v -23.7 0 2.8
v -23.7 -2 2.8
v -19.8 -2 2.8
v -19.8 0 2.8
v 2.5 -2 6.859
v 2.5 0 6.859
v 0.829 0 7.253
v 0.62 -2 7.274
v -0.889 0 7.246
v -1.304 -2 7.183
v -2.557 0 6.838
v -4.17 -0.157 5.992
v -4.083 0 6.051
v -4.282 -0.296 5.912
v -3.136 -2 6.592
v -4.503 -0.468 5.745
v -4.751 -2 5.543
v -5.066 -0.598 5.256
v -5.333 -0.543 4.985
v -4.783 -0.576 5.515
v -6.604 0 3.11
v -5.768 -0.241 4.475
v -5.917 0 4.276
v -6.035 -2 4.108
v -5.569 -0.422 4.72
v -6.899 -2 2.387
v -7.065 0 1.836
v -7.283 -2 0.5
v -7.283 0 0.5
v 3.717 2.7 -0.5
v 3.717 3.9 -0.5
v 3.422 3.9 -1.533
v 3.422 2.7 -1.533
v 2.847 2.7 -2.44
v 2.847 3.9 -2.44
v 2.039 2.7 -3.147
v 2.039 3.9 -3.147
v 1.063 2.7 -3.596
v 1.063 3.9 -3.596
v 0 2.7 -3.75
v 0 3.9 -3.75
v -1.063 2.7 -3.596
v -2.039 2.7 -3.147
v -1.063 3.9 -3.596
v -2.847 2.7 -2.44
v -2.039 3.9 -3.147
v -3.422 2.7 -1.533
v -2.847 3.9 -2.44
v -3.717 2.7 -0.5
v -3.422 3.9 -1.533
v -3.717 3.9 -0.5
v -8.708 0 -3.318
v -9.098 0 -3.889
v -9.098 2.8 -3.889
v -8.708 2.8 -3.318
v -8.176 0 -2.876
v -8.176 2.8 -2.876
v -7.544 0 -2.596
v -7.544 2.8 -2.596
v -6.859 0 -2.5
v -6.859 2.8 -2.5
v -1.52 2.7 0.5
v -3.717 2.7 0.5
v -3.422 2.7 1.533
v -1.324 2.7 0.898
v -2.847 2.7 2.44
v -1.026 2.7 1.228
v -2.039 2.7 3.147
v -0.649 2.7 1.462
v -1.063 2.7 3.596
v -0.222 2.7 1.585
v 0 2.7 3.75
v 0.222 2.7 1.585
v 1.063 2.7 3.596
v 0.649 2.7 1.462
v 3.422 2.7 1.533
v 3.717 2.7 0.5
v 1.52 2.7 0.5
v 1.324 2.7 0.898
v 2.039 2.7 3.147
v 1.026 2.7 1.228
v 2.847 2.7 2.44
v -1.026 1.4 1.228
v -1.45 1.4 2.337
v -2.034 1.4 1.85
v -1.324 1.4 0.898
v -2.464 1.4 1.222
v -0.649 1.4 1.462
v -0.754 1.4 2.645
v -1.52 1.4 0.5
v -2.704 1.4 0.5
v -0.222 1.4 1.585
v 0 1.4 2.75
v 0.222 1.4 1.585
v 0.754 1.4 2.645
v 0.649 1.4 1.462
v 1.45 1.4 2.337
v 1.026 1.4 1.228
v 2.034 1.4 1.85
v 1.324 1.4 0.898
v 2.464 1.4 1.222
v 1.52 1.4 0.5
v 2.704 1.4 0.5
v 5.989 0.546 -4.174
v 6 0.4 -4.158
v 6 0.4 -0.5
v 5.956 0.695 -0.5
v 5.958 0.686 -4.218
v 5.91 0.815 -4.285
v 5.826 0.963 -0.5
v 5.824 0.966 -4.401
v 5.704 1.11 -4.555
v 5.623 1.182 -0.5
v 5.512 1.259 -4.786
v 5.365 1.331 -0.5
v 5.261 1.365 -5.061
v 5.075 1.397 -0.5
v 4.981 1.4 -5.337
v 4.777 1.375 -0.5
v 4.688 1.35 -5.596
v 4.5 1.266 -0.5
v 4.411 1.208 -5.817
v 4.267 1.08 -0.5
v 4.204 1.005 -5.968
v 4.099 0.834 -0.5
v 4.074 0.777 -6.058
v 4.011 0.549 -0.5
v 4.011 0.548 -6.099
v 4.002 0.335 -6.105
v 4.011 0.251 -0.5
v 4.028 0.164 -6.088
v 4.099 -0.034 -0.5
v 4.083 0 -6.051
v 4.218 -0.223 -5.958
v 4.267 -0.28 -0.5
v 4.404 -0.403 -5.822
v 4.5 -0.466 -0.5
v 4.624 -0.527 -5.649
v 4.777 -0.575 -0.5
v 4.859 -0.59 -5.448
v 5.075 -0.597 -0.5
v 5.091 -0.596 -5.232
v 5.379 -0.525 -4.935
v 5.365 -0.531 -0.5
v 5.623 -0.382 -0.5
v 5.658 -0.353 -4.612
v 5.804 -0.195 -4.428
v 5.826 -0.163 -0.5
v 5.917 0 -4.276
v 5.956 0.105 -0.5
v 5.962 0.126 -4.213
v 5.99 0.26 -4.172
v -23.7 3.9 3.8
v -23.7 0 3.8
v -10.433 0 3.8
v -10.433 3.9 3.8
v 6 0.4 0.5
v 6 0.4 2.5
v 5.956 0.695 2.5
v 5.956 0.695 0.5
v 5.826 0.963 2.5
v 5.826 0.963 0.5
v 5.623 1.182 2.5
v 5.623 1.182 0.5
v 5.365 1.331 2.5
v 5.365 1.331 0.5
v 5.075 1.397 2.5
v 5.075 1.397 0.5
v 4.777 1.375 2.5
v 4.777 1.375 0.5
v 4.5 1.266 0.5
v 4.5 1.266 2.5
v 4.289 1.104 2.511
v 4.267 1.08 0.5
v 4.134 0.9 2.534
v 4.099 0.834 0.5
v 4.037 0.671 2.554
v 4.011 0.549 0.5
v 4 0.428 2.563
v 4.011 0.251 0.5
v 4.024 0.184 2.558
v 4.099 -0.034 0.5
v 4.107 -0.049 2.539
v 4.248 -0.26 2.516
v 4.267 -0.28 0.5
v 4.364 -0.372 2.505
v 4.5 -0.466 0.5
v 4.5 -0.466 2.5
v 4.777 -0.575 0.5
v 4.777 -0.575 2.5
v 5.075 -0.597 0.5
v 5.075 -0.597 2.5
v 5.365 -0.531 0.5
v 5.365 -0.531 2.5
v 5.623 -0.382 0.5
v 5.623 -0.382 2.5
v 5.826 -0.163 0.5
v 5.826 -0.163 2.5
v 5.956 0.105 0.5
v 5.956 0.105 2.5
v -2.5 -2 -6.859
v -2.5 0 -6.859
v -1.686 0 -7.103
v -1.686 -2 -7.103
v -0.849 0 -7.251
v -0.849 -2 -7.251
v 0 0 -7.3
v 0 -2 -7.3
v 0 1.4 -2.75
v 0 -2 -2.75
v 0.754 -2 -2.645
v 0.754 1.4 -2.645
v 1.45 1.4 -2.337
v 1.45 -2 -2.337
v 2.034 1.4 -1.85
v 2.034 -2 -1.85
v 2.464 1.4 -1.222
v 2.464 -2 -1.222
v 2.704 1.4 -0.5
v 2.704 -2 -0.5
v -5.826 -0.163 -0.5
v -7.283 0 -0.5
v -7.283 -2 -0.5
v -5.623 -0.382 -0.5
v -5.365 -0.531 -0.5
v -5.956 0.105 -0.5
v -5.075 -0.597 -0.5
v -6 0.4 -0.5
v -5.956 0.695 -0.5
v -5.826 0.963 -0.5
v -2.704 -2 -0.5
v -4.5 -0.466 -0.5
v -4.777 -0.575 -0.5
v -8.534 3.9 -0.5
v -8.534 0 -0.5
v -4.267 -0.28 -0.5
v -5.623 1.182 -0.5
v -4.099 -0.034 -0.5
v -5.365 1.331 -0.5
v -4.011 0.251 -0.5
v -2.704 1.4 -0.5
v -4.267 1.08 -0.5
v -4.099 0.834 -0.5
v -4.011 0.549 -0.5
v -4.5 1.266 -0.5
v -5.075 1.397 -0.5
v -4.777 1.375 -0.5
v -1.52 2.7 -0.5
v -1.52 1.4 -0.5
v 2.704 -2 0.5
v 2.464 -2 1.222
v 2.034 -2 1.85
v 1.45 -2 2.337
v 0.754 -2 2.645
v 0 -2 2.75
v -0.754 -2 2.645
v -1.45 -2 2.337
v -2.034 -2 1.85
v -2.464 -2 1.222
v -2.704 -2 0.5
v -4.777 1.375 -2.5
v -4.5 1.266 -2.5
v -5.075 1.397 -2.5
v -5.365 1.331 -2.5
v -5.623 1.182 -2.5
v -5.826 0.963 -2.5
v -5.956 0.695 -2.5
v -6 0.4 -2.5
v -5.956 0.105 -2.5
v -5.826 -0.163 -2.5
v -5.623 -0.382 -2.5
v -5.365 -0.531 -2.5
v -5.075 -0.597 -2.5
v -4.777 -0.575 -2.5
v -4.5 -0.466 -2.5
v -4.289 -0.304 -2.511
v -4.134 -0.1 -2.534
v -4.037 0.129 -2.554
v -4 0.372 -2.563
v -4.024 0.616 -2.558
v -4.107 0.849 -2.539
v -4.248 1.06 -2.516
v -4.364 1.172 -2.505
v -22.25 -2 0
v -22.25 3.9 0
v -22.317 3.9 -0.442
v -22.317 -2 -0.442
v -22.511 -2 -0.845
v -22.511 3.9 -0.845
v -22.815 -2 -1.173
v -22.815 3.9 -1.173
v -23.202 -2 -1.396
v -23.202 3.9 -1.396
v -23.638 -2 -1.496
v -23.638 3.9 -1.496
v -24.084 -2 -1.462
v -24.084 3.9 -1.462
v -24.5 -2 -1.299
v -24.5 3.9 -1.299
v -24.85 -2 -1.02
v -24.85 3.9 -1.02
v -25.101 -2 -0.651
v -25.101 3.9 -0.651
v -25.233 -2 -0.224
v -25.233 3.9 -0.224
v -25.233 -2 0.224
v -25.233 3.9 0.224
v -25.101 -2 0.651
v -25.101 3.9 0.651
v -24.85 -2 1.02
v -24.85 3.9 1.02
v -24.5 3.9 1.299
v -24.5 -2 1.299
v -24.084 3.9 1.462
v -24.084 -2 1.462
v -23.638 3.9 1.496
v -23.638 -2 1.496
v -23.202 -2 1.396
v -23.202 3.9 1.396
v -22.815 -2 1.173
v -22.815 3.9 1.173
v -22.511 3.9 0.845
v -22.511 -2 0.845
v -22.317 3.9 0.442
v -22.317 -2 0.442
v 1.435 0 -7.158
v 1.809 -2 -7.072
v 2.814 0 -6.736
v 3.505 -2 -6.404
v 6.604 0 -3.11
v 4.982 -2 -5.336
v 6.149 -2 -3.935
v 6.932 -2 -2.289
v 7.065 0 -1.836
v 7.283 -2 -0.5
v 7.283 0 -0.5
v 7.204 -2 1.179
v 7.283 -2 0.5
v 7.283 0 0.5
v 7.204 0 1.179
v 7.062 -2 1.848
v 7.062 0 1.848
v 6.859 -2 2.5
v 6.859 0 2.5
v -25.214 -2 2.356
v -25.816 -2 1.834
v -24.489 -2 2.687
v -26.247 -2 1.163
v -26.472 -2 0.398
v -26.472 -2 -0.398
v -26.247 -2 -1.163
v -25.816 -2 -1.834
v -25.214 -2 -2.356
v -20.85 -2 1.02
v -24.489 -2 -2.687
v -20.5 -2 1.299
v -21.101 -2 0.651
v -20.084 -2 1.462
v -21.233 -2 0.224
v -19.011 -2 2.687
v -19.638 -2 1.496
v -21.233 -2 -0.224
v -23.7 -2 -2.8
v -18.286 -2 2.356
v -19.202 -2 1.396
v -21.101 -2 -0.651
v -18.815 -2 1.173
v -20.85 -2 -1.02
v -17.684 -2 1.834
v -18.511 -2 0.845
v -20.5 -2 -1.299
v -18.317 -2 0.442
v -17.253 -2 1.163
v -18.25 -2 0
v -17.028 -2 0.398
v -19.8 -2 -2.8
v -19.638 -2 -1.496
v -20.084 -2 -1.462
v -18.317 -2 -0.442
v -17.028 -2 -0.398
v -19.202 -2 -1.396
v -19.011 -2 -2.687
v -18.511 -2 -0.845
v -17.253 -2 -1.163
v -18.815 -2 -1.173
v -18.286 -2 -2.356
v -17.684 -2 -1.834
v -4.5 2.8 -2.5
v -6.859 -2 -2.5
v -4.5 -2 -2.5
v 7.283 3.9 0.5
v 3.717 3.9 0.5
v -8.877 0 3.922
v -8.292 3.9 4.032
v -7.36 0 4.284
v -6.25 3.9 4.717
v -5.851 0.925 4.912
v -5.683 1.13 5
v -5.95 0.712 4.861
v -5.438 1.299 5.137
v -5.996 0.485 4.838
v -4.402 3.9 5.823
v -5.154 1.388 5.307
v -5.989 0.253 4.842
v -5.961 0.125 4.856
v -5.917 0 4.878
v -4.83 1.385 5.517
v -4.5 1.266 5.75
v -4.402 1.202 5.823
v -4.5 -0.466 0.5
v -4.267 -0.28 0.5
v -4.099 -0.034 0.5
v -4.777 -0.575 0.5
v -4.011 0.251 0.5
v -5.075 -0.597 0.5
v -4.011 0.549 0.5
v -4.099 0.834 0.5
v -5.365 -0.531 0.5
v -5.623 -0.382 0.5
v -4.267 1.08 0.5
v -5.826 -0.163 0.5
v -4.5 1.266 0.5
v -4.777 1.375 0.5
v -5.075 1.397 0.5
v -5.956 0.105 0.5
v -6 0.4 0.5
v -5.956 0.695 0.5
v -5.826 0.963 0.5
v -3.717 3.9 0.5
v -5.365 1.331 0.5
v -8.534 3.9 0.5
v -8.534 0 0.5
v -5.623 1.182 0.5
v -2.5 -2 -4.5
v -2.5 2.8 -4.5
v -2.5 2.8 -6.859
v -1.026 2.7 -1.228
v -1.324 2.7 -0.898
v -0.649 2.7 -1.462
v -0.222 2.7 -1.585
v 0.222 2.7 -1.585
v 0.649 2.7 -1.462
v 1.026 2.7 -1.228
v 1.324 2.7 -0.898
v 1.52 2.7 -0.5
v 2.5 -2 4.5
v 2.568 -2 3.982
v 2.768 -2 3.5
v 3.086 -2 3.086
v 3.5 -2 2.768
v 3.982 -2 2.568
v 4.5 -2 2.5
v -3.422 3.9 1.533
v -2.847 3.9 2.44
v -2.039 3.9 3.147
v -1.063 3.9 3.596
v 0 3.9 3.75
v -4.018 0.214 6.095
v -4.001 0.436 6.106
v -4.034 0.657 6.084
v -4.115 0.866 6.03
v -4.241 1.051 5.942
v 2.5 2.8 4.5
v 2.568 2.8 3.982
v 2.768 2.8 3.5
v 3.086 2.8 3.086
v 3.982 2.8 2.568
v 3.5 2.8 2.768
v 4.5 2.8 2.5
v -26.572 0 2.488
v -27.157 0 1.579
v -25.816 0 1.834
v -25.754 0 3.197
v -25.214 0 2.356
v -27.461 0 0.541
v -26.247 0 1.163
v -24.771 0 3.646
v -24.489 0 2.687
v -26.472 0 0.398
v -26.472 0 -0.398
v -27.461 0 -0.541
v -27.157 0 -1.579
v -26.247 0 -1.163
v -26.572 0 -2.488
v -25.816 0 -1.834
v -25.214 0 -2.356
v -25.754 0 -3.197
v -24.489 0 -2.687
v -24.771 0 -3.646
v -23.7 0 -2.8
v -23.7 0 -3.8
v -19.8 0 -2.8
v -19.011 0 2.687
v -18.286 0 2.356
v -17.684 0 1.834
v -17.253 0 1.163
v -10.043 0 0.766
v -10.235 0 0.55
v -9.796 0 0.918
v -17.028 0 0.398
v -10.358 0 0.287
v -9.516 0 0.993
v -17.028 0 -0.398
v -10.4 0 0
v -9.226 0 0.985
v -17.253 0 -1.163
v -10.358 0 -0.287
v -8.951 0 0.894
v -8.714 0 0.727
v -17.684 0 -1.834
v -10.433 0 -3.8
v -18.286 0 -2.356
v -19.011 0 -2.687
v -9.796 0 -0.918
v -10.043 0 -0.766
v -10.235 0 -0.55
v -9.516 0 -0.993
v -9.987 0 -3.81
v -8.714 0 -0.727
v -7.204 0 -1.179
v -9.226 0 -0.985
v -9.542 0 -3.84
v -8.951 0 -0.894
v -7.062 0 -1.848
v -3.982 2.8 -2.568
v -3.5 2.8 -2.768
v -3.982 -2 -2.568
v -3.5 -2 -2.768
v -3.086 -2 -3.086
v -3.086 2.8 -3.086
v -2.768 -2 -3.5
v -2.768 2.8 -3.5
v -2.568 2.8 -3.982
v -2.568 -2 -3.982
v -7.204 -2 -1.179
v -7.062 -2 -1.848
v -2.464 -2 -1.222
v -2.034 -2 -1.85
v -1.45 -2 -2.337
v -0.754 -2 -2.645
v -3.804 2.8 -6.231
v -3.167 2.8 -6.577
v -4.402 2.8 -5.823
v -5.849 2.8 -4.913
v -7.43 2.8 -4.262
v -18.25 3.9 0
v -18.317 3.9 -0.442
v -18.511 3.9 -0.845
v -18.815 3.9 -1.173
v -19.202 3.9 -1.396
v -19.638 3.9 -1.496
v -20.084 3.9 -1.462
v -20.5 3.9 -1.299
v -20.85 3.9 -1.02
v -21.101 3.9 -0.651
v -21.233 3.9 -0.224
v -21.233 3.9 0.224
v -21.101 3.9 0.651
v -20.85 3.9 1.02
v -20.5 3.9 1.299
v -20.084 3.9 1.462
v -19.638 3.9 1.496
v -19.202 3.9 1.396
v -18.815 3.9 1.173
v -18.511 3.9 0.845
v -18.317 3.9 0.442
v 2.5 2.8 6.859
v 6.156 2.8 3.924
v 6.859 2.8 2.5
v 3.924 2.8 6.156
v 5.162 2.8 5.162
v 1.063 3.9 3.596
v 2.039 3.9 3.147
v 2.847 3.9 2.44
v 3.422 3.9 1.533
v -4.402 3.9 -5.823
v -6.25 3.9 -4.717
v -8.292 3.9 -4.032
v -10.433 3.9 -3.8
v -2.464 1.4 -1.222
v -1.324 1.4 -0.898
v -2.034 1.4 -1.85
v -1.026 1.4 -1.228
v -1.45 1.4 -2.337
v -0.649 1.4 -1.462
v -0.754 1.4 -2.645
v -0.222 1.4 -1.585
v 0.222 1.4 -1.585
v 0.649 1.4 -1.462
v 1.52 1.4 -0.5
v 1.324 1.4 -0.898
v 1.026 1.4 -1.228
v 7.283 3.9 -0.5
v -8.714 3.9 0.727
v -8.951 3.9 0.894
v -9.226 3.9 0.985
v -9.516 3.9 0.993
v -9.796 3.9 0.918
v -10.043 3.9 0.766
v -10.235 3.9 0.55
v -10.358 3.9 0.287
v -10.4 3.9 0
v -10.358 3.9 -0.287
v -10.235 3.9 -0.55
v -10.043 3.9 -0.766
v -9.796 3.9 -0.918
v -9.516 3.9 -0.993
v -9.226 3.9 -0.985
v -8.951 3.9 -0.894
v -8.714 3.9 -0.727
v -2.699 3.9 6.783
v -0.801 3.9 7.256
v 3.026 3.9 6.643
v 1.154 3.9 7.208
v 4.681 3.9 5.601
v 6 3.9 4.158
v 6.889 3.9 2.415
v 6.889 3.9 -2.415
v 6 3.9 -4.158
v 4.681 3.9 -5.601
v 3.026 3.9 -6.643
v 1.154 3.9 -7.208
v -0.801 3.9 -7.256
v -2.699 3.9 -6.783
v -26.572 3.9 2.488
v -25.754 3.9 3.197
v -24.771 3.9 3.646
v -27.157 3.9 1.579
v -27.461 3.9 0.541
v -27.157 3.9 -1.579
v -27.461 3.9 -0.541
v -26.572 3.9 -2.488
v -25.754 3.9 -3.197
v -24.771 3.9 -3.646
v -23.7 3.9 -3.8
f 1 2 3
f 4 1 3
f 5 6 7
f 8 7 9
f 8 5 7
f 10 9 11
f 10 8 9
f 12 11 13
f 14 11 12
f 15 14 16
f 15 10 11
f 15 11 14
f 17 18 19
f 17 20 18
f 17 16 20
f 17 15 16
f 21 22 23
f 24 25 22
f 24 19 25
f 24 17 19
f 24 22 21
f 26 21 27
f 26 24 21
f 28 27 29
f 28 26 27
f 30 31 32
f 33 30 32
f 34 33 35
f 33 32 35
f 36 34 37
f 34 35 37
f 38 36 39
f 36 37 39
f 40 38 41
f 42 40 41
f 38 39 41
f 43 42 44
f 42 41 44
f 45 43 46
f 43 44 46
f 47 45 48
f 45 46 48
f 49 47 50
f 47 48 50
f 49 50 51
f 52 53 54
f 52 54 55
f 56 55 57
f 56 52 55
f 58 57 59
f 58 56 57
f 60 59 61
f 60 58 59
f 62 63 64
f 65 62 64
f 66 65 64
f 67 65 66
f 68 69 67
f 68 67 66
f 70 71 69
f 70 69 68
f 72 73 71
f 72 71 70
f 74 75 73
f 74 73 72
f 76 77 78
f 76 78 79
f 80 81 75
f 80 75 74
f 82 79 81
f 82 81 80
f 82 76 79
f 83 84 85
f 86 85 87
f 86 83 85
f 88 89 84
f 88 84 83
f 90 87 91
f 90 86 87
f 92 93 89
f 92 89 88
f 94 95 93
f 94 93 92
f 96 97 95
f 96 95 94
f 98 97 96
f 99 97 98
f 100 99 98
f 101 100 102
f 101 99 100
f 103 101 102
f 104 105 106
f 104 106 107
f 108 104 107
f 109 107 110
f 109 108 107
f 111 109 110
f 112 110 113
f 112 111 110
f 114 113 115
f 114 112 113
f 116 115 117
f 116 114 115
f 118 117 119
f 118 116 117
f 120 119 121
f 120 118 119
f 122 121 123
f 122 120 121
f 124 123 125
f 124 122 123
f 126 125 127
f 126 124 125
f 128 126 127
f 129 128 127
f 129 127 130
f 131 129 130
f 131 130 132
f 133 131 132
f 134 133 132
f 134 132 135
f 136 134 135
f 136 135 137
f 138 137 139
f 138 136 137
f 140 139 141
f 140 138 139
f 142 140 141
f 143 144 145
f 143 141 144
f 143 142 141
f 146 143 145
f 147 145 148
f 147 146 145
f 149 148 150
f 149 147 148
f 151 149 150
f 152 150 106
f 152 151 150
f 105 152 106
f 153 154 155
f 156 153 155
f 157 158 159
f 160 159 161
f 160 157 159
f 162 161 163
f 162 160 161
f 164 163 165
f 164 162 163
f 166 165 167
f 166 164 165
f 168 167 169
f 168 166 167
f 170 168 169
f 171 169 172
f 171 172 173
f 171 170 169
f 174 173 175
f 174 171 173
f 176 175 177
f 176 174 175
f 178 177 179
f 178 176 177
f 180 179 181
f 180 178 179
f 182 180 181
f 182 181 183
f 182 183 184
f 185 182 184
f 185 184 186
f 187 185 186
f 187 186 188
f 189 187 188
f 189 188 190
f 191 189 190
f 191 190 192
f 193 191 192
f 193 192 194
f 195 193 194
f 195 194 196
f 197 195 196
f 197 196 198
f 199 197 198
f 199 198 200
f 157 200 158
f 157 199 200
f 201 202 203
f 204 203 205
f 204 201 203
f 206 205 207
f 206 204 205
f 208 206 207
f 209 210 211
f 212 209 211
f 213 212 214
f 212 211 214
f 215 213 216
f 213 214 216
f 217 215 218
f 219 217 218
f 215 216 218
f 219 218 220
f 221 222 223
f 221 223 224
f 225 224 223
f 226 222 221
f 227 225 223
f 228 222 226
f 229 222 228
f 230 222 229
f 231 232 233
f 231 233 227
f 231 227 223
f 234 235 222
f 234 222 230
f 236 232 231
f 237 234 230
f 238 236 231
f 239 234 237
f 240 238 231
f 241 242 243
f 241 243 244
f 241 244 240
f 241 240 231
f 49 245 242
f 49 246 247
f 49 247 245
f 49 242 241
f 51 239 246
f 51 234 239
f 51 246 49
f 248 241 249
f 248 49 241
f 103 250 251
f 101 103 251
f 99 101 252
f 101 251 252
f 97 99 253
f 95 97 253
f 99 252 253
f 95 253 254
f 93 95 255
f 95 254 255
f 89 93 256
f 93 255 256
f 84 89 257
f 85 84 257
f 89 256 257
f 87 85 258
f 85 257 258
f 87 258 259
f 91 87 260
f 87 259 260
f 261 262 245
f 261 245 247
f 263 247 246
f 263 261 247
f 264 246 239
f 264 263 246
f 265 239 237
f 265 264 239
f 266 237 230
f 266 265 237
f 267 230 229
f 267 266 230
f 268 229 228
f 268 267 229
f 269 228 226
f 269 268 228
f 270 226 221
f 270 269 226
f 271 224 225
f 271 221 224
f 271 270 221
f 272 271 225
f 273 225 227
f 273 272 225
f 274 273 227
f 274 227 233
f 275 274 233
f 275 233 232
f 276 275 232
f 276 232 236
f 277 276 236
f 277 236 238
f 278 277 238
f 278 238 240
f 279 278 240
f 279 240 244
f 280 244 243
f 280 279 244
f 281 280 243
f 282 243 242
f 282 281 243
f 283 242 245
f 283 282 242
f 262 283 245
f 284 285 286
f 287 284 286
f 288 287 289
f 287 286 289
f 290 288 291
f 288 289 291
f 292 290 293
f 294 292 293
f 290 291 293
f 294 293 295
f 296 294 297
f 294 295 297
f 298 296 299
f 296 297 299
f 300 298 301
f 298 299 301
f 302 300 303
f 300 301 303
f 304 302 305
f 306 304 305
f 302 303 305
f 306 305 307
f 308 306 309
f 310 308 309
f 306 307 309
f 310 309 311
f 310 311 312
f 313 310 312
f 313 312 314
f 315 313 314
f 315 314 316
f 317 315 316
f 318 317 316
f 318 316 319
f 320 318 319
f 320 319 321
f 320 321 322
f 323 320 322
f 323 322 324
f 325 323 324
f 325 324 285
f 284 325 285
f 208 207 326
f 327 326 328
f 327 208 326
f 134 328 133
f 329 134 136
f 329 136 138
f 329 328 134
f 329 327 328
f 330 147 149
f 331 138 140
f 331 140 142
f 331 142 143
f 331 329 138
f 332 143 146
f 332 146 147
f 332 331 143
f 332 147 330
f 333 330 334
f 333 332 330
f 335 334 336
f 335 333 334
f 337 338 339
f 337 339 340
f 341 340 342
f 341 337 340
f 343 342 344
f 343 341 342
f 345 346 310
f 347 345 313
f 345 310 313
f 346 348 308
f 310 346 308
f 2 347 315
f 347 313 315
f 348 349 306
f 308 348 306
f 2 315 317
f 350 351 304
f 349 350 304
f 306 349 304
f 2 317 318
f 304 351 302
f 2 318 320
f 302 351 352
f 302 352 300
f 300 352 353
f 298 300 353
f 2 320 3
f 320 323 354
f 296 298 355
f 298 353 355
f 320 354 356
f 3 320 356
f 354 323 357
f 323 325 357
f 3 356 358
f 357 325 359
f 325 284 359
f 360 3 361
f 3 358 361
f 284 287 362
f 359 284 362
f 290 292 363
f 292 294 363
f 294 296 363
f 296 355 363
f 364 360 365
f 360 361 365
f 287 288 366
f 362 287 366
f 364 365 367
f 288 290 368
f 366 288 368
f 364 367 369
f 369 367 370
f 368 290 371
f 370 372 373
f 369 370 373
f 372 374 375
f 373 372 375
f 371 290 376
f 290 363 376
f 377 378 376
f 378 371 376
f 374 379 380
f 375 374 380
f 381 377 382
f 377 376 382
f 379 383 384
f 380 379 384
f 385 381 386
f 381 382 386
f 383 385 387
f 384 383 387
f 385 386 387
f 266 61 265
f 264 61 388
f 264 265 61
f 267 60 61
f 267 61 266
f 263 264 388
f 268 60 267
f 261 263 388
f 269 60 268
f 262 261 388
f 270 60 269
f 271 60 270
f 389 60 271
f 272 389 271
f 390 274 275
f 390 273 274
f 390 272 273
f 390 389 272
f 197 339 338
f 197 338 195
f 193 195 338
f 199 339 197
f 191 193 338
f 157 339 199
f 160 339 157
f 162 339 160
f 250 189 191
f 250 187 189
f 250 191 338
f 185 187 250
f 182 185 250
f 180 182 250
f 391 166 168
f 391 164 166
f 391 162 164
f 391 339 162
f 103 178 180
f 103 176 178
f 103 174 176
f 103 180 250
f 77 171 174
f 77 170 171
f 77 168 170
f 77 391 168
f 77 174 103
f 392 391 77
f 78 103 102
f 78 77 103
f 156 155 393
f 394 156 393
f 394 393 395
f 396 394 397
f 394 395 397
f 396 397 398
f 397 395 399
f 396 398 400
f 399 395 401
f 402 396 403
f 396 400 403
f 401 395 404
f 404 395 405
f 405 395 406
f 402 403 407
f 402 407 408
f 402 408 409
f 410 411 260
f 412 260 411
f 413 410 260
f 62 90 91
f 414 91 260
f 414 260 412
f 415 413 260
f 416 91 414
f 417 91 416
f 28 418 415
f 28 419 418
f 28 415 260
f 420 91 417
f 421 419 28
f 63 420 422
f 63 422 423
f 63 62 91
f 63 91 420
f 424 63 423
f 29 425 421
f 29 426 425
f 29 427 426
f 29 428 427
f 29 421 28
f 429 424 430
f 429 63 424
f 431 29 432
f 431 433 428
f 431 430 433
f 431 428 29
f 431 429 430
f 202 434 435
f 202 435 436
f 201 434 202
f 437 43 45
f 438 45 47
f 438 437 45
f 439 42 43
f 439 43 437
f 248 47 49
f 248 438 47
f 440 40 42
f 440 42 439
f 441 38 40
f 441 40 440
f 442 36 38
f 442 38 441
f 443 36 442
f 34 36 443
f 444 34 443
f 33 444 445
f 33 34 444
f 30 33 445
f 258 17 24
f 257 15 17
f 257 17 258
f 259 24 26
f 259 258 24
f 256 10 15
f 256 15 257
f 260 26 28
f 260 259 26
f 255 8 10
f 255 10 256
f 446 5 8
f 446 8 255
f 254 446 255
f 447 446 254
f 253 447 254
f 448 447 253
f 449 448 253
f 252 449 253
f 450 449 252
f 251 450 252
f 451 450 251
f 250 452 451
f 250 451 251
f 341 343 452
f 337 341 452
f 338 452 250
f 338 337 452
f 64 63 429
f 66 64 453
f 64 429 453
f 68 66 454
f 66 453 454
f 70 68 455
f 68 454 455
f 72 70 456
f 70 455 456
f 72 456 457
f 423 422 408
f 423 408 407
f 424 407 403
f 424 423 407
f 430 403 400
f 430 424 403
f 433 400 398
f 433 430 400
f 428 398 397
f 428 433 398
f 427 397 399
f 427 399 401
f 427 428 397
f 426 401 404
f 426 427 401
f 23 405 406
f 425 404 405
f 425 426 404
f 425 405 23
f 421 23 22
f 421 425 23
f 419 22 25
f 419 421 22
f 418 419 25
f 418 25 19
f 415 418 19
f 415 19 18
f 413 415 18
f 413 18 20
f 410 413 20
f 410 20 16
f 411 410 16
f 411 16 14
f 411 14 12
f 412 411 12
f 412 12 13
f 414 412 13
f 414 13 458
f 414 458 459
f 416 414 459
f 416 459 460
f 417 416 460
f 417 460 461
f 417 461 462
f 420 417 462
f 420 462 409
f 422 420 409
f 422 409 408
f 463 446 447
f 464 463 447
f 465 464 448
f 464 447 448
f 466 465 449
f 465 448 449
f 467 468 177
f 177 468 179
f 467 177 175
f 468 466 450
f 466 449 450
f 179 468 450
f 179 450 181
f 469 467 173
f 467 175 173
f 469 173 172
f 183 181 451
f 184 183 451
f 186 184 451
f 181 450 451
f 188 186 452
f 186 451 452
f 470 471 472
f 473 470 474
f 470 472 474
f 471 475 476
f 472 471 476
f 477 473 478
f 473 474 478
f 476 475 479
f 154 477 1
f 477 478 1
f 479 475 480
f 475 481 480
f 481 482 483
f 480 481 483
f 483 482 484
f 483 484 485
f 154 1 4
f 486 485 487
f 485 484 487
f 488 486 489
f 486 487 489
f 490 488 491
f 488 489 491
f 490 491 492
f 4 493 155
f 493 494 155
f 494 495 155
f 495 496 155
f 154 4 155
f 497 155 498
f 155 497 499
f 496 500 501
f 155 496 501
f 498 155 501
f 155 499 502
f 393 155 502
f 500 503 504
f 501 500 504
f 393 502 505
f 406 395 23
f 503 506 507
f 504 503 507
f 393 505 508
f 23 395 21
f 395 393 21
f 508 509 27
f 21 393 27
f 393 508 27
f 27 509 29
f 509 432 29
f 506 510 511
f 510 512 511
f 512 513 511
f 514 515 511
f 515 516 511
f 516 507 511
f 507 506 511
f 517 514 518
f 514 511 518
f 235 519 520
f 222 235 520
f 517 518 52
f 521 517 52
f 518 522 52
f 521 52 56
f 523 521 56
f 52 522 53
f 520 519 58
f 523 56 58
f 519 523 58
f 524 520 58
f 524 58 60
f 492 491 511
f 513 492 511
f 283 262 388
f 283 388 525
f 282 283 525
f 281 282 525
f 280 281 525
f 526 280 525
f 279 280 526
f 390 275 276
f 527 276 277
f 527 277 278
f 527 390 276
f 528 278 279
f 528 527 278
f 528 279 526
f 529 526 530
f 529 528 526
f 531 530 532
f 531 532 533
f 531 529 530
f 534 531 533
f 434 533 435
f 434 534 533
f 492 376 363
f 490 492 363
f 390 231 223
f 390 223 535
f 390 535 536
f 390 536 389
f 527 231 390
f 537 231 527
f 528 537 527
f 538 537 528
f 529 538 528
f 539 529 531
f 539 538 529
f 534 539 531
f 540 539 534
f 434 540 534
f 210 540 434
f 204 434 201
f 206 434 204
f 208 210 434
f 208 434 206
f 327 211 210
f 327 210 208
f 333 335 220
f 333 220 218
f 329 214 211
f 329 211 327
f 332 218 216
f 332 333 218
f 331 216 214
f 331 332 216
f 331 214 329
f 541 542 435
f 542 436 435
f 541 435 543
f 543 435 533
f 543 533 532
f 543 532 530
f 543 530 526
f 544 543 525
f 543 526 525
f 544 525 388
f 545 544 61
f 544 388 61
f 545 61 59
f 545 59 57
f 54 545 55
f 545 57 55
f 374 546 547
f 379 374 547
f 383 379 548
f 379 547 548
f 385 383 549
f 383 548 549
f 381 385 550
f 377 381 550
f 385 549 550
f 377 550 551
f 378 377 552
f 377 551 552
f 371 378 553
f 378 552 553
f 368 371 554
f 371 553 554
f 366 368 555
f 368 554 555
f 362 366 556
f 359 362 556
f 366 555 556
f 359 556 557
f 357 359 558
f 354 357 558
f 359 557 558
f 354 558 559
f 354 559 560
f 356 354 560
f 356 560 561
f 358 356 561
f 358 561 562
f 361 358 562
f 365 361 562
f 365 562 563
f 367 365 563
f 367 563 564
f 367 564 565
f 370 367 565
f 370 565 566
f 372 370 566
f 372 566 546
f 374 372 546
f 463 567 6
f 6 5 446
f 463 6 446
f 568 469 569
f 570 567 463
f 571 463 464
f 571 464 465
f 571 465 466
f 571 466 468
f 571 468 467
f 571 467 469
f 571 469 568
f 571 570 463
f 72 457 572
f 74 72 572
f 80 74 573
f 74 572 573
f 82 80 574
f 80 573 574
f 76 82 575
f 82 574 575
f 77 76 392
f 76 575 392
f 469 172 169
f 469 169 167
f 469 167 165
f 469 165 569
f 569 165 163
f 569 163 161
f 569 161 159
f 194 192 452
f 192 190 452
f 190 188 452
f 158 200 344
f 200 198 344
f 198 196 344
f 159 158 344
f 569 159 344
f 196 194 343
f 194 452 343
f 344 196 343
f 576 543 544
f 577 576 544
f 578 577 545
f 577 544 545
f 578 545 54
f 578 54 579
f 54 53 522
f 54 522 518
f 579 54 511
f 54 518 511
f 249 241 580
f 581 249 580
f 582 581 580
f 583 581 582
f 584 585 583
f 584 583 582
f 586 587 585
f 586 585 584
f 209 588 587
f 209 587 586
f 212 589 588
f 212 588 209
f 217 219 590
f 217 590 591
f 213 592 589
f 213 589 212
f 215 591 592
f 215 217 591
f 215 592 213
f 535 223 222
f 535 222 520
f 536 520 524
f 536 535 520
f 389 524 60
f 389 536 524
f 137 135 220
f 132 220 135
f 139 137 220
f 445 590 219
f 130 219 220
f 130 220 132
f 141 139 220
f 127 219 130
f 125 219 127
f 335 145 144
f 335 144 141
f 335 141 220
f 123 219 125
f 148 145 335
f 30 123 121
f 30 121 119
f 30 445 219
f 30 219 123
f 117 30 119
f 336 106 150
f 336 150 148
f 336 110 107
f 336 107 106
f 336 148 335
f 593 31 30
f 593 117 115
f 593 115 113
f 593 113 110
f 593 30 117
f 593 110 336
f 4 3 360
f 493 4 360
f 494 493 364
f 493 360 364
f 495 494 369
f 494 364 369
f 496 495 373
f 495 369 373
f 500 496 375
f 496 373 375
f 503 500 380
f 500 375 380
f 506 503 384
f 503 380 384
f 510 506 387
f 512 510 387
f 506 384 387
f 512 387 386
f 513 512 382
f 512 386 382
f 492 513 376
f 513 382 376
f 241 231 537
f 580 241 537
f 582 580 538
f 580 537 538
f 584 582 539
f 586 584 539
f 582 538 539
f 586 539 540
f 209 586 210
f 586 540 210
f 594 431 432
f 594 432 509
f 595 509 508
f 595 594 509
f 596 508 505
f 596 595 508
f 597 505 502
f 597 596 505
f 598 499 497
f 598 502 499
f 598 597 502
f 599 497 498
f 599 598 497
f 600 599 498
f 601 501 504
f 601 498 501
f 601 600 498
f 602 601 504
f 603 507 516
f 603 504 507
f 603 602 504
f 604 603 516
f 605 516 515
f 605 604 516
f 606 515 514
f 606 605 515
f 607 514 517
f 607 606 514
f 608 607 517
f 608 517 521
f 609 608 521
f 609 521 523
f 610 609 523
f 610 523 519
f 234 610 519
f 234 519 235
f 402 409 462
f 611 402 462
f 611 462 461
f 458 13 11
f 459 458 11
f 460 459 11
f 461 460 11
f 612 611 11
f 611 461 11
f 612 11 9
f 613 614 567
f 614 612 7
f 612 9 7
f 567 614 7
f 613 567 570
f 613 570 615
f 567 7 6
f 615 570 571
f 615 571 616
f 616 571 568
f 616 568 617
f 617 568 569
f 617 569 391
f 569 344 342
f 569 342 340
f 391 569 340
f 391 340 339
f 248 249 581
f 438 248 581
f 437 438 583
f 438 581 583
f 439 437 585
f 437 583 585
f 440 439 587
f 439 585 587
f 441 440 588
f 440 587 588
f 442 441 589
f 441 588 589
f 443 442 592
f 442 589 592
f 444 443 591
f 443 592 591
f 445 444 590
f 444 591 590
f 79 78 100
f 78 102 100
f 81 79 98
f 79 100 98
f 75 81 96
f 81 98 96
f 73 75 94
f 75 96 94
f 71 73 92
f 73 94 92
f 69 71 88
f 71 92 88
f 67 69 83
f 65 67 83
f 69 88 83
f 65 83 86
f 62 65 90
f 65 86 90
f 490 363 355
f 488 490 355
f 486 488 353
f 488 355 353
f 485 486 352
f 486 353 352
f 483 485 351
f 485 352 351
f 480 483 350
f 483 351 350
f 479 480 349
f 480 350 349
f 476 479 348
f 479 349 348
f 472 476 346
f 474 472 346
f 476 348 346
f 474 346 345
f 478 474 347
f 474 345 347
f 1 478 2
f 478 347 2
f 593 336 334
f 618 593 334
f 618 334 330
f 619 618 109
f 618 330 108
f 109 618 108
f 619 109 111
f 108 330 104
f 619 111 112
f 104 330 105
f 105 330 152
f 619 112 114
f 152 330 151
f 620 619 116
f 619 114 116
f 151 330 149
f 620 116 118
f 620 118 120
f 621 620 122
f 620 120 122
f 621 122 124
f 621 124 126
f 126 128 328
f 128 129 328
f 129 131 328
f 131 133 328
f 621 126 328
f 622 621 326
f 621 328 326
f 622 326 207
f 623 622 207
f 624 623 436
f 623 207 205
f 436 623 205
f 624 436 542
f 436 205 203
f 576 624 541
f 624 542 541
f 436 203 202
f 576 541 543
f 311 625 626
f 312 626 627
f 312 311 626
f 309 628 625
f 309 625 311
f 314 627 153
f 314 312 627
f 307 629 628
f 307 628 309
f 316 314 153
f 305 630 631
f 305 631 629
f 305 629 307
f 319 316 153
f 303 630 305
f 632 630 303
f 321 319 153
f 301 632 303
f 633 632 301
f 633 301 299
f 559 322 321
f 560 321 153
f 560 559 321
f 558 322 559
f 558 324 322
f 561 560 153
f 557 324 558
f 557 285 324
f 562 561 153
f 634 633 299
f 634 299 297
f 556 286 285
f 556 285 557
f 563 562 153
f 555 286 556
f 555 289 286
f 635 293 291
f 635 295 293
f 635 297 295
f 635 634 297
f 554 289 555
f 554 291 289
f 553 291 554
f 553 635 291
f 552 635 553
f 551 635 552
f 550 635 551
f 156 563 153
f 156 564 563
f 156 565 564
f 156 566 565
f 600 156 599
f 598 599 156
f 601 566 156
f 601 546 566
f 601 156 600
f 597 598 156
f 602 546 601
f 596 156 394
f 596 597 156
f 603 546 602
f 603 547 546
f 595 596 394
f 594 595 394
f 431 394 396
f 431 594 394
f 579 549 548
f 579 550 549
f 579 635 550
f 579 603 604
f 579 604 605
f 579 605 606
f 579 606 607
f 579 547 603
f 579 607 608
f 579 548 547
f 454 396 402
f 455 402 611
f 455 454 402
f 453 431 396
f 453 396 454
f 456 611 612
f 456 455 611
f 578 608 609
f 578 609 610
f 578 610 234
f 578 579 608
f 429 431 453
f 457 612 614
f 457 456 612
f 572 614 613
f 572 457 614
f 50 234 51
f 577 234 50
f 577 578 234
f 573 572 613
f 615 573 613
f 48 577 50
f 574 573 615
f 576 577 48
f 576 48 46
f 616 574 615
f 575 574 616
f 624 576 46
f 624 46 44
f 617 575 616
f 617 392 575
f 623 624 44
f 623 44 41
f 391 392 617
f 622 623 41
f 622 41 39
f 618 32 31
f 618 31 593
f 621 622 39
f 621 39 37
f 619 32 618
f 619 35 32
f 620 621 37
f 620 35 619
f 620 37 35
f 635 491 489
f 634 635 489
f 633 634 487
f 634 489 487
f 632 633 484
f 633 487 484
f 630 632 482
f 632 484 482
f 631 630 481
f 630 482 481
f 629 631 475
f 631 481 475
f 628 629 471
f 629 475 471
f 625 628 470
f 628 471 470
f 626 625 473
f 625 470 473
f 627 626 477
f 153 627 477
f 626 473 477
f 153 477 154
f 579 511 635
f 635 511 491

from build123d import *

# Parameters (mm, degrees)
BOSS_EXTRU_1_DEPTH            = 3.9
BOSS_EXTRU_2_START            = 2
ESQUISSE2_R                   = 7.3
BOSS_EXTRU_2_DEPTH            = 2
D_GAGEMENT_M31_D              = 3.2
DIAM_TRE_DU_PER_AGE_3_0_3_1_D = 3
ESQUISSE6_R                   = 2.75
ENL_V_MAT_EXTRU_1_DEPTH       = 3.4
ESQUISSE9_R                   = 3.75
ENL_V_MAT_EXTRU_2_DEPTH       = 1.2
ENL_V_MAT_EXTRU_3_DEPTH       = 30.057701217
ENL_V_MAT_EXTRU_4_DEPTH       = 4.8
ENL_V_MAT_EXTRU_5_DEPTH       = 29.718460962
ENL_V_MAT_EXTRU_5_DEPTH_BACK  = 29.718460962
ESQUISSE14_R                  = 1


with BuildPart() as part:
    # Esquisse1 → Boss.-Extru.1 (new body)
    with BuildSketch(Plane(origin=(0, 0, 0), x_dir=(1, 0, 0), z_dir=(0, 1, 0))):
        with BuildLine():
            Line((-10.433120339, 3.8), (-23.7, 3.8))
            ThreePointArc((-23.7, 3.8), (-27.5, 0), (-23.7, -3.8))
            Line((-23.7, -3.8), (-10.433120339, -3.8))
            ThreePointArc((-10.433120339, -3.8), (-7.252616143, -4.319261998), (-4.402414941, -5.823121387))
            ThreePointArc((-4.402414941, -5.823121387), (7.3, 0), (-4.402414941, 5.823121387))
            ThreePointArc((-4.402414941, 5.823121387), (-7.252616143, 4.319261998), (-10.433120339, 3.8))
        make_face()
    extrude(amount=BOSS_EXTRU_1_DEPTH)

    # Esquisse2 → Boss.-Extru.2 (add)
    with BuildSketch(Plane(origin=(0, 0, 0), x_dir=(-1, 0, 0), z_dir=(0, -1, 0)).offset(BOSS_EXTRU_2_START)):
        Circle(ESQUISSE2_R)
        with BuildLine():
            Line((23.7, -2.8), (19.8, -2.8))
            ThreePointArc((19.8, -2.8), (17, 0), (19.8, 2.8))
            Line((19.8, 2.8), (23.7, 2.8))
            ThreePointArc((23.7, 2.8), (26.5, 0), (23.7, -2.8))
        make_face()
    extrude(amount=-BOSS_EXTRU_2_DEPTH)

    # Dégagement M31 (through all)
    with Locations(Plane(origin=(0, 3.9, 0), x_dir=(1, 0, 0), z_dir=(0, 1, 0))):
        with Locations((0, 0)):
            Hole(D_GAGEMENT_M31_D / 2)

    # Diamètre du perçage Ø3.0 (3)1 (through all)
    with Locations(Plane(origin=(0, -2, 0), x_dir=(-1, 0, 0), z_dir=(0, -1, 0))):
        with Locations((19.75, 0), (23.75, 0)):
            Hole(DIAM_TRE_DU_PER_AGE_3_0_3_1_D / 2)

    # Esquisse6 → Enlèv. mat.-Extru.1 (cut)
    with BuildSketch(Plane.XZ.offset(2)):
        Circle(ESQUISSE6_R)
    extrude(amount=-ENL_V_MAT_EXTRU_1_DEPTH, mode=Mode.SUBTRACT)

    # Esquisse9 → Enlèv. mat.-Extru.2 (cut)
    with BuildSketch(Plane(origin=(0, 3.9, 0), x_dir=(1, 0, 0), z_dir=(0, 1, 0))):
        Circle(ESQUISSE9_R)
    extrude(amount=-ENL_V_MAT_EXTRU_2_DEPTH, mode=Mode.SUBTRACT)

    # Esquisse10 → Enlèv. mat.-Extru.3 (cut, through all)
    with BuildSketch(Plane(origin=(0, 3.9, 0), x_dir=(1, 0, 0), z_dir=(0, 1, 0))):
        with BuildLine():
            Line((-8.533974596, 0.5), (7.987060463, 0.5))
            Line((7.987060463, 0.5), (7.987060463, -0.5))
            Line((7.987060463, -0.5), (-8.533974596, -0.5))
            ThreePointArc((-8.533974596, -0.5), (-10.4, 0), (-8.533974596, 0.5))
        make_face()
    extrude(amount=-ENL_V_MAT_EXTRU_3_DEPTH, mode=Mode.SUBTRACT)

    # Esquisse11 → Enlèv. mat.-Extru.4 (cut)
    with BuildSketch(Plane.XZ.offset(2)):
        with BuildLine():
            Line((2.5, 6.85857128), (2.5, 4.5))
            ThreePointArc((2.5, 4.5), (3.085786438, 3.085786438), (4.5, 2.5))
            Line((4.5, 2.5), (6.85857128, 2.5))
            ThreePointArc((6.85857128, 2.5), (5.161879503, 5.161879503), (2.5, 6.85857128))
        make_face()
        with BuildLine():
            Line((-2.5, -4.5), (-2.5, -6.85857128))
            Line((-2.5, -6.85857128), (-4.5, -6.85857128))
            Line((-4.5, -6.85857128), (-9.098379022, -3.889477026))
            ThreePointArc((-9.098379022, -3.889477026), (-8.17646592, -2.875581558), (-6.85857128, -2.5))
            Line((-6.85857128, -2.5), (-4.5, -2.5))
            ThreePointArc((-4.5, -2.5), (-3.085786438, -3.085786438), (-2.5, -4.5))
        make_face()
    extrude(amount=-ENL_V_MAT_EXTRU_4_DEPTH, mode=Mode.SUBTRACT)

    # Esquisse14 → Enlèv. mat.-Extru.5 (cut, two sides: drawn at the far end of the back side and taken through both)
    with BuildSketch(Plane.XY.offset(-ENL_V_MAT_EXTRU_5_DEPTH_BACK)):
        with Locations((5, 0.4)):
            Circle(ESQUISSE14_R)
        with Locations((-5, 0.4)):
            Circle(ESQUISSE14_R)
    extrude(amount=ENL_V_MAT_EXTRU_5_DEPTH + ENL_V_MAT_EXTRU_5_DEPTH_BACK, mode=Mode.SUBTRACT)


solid = part.part
